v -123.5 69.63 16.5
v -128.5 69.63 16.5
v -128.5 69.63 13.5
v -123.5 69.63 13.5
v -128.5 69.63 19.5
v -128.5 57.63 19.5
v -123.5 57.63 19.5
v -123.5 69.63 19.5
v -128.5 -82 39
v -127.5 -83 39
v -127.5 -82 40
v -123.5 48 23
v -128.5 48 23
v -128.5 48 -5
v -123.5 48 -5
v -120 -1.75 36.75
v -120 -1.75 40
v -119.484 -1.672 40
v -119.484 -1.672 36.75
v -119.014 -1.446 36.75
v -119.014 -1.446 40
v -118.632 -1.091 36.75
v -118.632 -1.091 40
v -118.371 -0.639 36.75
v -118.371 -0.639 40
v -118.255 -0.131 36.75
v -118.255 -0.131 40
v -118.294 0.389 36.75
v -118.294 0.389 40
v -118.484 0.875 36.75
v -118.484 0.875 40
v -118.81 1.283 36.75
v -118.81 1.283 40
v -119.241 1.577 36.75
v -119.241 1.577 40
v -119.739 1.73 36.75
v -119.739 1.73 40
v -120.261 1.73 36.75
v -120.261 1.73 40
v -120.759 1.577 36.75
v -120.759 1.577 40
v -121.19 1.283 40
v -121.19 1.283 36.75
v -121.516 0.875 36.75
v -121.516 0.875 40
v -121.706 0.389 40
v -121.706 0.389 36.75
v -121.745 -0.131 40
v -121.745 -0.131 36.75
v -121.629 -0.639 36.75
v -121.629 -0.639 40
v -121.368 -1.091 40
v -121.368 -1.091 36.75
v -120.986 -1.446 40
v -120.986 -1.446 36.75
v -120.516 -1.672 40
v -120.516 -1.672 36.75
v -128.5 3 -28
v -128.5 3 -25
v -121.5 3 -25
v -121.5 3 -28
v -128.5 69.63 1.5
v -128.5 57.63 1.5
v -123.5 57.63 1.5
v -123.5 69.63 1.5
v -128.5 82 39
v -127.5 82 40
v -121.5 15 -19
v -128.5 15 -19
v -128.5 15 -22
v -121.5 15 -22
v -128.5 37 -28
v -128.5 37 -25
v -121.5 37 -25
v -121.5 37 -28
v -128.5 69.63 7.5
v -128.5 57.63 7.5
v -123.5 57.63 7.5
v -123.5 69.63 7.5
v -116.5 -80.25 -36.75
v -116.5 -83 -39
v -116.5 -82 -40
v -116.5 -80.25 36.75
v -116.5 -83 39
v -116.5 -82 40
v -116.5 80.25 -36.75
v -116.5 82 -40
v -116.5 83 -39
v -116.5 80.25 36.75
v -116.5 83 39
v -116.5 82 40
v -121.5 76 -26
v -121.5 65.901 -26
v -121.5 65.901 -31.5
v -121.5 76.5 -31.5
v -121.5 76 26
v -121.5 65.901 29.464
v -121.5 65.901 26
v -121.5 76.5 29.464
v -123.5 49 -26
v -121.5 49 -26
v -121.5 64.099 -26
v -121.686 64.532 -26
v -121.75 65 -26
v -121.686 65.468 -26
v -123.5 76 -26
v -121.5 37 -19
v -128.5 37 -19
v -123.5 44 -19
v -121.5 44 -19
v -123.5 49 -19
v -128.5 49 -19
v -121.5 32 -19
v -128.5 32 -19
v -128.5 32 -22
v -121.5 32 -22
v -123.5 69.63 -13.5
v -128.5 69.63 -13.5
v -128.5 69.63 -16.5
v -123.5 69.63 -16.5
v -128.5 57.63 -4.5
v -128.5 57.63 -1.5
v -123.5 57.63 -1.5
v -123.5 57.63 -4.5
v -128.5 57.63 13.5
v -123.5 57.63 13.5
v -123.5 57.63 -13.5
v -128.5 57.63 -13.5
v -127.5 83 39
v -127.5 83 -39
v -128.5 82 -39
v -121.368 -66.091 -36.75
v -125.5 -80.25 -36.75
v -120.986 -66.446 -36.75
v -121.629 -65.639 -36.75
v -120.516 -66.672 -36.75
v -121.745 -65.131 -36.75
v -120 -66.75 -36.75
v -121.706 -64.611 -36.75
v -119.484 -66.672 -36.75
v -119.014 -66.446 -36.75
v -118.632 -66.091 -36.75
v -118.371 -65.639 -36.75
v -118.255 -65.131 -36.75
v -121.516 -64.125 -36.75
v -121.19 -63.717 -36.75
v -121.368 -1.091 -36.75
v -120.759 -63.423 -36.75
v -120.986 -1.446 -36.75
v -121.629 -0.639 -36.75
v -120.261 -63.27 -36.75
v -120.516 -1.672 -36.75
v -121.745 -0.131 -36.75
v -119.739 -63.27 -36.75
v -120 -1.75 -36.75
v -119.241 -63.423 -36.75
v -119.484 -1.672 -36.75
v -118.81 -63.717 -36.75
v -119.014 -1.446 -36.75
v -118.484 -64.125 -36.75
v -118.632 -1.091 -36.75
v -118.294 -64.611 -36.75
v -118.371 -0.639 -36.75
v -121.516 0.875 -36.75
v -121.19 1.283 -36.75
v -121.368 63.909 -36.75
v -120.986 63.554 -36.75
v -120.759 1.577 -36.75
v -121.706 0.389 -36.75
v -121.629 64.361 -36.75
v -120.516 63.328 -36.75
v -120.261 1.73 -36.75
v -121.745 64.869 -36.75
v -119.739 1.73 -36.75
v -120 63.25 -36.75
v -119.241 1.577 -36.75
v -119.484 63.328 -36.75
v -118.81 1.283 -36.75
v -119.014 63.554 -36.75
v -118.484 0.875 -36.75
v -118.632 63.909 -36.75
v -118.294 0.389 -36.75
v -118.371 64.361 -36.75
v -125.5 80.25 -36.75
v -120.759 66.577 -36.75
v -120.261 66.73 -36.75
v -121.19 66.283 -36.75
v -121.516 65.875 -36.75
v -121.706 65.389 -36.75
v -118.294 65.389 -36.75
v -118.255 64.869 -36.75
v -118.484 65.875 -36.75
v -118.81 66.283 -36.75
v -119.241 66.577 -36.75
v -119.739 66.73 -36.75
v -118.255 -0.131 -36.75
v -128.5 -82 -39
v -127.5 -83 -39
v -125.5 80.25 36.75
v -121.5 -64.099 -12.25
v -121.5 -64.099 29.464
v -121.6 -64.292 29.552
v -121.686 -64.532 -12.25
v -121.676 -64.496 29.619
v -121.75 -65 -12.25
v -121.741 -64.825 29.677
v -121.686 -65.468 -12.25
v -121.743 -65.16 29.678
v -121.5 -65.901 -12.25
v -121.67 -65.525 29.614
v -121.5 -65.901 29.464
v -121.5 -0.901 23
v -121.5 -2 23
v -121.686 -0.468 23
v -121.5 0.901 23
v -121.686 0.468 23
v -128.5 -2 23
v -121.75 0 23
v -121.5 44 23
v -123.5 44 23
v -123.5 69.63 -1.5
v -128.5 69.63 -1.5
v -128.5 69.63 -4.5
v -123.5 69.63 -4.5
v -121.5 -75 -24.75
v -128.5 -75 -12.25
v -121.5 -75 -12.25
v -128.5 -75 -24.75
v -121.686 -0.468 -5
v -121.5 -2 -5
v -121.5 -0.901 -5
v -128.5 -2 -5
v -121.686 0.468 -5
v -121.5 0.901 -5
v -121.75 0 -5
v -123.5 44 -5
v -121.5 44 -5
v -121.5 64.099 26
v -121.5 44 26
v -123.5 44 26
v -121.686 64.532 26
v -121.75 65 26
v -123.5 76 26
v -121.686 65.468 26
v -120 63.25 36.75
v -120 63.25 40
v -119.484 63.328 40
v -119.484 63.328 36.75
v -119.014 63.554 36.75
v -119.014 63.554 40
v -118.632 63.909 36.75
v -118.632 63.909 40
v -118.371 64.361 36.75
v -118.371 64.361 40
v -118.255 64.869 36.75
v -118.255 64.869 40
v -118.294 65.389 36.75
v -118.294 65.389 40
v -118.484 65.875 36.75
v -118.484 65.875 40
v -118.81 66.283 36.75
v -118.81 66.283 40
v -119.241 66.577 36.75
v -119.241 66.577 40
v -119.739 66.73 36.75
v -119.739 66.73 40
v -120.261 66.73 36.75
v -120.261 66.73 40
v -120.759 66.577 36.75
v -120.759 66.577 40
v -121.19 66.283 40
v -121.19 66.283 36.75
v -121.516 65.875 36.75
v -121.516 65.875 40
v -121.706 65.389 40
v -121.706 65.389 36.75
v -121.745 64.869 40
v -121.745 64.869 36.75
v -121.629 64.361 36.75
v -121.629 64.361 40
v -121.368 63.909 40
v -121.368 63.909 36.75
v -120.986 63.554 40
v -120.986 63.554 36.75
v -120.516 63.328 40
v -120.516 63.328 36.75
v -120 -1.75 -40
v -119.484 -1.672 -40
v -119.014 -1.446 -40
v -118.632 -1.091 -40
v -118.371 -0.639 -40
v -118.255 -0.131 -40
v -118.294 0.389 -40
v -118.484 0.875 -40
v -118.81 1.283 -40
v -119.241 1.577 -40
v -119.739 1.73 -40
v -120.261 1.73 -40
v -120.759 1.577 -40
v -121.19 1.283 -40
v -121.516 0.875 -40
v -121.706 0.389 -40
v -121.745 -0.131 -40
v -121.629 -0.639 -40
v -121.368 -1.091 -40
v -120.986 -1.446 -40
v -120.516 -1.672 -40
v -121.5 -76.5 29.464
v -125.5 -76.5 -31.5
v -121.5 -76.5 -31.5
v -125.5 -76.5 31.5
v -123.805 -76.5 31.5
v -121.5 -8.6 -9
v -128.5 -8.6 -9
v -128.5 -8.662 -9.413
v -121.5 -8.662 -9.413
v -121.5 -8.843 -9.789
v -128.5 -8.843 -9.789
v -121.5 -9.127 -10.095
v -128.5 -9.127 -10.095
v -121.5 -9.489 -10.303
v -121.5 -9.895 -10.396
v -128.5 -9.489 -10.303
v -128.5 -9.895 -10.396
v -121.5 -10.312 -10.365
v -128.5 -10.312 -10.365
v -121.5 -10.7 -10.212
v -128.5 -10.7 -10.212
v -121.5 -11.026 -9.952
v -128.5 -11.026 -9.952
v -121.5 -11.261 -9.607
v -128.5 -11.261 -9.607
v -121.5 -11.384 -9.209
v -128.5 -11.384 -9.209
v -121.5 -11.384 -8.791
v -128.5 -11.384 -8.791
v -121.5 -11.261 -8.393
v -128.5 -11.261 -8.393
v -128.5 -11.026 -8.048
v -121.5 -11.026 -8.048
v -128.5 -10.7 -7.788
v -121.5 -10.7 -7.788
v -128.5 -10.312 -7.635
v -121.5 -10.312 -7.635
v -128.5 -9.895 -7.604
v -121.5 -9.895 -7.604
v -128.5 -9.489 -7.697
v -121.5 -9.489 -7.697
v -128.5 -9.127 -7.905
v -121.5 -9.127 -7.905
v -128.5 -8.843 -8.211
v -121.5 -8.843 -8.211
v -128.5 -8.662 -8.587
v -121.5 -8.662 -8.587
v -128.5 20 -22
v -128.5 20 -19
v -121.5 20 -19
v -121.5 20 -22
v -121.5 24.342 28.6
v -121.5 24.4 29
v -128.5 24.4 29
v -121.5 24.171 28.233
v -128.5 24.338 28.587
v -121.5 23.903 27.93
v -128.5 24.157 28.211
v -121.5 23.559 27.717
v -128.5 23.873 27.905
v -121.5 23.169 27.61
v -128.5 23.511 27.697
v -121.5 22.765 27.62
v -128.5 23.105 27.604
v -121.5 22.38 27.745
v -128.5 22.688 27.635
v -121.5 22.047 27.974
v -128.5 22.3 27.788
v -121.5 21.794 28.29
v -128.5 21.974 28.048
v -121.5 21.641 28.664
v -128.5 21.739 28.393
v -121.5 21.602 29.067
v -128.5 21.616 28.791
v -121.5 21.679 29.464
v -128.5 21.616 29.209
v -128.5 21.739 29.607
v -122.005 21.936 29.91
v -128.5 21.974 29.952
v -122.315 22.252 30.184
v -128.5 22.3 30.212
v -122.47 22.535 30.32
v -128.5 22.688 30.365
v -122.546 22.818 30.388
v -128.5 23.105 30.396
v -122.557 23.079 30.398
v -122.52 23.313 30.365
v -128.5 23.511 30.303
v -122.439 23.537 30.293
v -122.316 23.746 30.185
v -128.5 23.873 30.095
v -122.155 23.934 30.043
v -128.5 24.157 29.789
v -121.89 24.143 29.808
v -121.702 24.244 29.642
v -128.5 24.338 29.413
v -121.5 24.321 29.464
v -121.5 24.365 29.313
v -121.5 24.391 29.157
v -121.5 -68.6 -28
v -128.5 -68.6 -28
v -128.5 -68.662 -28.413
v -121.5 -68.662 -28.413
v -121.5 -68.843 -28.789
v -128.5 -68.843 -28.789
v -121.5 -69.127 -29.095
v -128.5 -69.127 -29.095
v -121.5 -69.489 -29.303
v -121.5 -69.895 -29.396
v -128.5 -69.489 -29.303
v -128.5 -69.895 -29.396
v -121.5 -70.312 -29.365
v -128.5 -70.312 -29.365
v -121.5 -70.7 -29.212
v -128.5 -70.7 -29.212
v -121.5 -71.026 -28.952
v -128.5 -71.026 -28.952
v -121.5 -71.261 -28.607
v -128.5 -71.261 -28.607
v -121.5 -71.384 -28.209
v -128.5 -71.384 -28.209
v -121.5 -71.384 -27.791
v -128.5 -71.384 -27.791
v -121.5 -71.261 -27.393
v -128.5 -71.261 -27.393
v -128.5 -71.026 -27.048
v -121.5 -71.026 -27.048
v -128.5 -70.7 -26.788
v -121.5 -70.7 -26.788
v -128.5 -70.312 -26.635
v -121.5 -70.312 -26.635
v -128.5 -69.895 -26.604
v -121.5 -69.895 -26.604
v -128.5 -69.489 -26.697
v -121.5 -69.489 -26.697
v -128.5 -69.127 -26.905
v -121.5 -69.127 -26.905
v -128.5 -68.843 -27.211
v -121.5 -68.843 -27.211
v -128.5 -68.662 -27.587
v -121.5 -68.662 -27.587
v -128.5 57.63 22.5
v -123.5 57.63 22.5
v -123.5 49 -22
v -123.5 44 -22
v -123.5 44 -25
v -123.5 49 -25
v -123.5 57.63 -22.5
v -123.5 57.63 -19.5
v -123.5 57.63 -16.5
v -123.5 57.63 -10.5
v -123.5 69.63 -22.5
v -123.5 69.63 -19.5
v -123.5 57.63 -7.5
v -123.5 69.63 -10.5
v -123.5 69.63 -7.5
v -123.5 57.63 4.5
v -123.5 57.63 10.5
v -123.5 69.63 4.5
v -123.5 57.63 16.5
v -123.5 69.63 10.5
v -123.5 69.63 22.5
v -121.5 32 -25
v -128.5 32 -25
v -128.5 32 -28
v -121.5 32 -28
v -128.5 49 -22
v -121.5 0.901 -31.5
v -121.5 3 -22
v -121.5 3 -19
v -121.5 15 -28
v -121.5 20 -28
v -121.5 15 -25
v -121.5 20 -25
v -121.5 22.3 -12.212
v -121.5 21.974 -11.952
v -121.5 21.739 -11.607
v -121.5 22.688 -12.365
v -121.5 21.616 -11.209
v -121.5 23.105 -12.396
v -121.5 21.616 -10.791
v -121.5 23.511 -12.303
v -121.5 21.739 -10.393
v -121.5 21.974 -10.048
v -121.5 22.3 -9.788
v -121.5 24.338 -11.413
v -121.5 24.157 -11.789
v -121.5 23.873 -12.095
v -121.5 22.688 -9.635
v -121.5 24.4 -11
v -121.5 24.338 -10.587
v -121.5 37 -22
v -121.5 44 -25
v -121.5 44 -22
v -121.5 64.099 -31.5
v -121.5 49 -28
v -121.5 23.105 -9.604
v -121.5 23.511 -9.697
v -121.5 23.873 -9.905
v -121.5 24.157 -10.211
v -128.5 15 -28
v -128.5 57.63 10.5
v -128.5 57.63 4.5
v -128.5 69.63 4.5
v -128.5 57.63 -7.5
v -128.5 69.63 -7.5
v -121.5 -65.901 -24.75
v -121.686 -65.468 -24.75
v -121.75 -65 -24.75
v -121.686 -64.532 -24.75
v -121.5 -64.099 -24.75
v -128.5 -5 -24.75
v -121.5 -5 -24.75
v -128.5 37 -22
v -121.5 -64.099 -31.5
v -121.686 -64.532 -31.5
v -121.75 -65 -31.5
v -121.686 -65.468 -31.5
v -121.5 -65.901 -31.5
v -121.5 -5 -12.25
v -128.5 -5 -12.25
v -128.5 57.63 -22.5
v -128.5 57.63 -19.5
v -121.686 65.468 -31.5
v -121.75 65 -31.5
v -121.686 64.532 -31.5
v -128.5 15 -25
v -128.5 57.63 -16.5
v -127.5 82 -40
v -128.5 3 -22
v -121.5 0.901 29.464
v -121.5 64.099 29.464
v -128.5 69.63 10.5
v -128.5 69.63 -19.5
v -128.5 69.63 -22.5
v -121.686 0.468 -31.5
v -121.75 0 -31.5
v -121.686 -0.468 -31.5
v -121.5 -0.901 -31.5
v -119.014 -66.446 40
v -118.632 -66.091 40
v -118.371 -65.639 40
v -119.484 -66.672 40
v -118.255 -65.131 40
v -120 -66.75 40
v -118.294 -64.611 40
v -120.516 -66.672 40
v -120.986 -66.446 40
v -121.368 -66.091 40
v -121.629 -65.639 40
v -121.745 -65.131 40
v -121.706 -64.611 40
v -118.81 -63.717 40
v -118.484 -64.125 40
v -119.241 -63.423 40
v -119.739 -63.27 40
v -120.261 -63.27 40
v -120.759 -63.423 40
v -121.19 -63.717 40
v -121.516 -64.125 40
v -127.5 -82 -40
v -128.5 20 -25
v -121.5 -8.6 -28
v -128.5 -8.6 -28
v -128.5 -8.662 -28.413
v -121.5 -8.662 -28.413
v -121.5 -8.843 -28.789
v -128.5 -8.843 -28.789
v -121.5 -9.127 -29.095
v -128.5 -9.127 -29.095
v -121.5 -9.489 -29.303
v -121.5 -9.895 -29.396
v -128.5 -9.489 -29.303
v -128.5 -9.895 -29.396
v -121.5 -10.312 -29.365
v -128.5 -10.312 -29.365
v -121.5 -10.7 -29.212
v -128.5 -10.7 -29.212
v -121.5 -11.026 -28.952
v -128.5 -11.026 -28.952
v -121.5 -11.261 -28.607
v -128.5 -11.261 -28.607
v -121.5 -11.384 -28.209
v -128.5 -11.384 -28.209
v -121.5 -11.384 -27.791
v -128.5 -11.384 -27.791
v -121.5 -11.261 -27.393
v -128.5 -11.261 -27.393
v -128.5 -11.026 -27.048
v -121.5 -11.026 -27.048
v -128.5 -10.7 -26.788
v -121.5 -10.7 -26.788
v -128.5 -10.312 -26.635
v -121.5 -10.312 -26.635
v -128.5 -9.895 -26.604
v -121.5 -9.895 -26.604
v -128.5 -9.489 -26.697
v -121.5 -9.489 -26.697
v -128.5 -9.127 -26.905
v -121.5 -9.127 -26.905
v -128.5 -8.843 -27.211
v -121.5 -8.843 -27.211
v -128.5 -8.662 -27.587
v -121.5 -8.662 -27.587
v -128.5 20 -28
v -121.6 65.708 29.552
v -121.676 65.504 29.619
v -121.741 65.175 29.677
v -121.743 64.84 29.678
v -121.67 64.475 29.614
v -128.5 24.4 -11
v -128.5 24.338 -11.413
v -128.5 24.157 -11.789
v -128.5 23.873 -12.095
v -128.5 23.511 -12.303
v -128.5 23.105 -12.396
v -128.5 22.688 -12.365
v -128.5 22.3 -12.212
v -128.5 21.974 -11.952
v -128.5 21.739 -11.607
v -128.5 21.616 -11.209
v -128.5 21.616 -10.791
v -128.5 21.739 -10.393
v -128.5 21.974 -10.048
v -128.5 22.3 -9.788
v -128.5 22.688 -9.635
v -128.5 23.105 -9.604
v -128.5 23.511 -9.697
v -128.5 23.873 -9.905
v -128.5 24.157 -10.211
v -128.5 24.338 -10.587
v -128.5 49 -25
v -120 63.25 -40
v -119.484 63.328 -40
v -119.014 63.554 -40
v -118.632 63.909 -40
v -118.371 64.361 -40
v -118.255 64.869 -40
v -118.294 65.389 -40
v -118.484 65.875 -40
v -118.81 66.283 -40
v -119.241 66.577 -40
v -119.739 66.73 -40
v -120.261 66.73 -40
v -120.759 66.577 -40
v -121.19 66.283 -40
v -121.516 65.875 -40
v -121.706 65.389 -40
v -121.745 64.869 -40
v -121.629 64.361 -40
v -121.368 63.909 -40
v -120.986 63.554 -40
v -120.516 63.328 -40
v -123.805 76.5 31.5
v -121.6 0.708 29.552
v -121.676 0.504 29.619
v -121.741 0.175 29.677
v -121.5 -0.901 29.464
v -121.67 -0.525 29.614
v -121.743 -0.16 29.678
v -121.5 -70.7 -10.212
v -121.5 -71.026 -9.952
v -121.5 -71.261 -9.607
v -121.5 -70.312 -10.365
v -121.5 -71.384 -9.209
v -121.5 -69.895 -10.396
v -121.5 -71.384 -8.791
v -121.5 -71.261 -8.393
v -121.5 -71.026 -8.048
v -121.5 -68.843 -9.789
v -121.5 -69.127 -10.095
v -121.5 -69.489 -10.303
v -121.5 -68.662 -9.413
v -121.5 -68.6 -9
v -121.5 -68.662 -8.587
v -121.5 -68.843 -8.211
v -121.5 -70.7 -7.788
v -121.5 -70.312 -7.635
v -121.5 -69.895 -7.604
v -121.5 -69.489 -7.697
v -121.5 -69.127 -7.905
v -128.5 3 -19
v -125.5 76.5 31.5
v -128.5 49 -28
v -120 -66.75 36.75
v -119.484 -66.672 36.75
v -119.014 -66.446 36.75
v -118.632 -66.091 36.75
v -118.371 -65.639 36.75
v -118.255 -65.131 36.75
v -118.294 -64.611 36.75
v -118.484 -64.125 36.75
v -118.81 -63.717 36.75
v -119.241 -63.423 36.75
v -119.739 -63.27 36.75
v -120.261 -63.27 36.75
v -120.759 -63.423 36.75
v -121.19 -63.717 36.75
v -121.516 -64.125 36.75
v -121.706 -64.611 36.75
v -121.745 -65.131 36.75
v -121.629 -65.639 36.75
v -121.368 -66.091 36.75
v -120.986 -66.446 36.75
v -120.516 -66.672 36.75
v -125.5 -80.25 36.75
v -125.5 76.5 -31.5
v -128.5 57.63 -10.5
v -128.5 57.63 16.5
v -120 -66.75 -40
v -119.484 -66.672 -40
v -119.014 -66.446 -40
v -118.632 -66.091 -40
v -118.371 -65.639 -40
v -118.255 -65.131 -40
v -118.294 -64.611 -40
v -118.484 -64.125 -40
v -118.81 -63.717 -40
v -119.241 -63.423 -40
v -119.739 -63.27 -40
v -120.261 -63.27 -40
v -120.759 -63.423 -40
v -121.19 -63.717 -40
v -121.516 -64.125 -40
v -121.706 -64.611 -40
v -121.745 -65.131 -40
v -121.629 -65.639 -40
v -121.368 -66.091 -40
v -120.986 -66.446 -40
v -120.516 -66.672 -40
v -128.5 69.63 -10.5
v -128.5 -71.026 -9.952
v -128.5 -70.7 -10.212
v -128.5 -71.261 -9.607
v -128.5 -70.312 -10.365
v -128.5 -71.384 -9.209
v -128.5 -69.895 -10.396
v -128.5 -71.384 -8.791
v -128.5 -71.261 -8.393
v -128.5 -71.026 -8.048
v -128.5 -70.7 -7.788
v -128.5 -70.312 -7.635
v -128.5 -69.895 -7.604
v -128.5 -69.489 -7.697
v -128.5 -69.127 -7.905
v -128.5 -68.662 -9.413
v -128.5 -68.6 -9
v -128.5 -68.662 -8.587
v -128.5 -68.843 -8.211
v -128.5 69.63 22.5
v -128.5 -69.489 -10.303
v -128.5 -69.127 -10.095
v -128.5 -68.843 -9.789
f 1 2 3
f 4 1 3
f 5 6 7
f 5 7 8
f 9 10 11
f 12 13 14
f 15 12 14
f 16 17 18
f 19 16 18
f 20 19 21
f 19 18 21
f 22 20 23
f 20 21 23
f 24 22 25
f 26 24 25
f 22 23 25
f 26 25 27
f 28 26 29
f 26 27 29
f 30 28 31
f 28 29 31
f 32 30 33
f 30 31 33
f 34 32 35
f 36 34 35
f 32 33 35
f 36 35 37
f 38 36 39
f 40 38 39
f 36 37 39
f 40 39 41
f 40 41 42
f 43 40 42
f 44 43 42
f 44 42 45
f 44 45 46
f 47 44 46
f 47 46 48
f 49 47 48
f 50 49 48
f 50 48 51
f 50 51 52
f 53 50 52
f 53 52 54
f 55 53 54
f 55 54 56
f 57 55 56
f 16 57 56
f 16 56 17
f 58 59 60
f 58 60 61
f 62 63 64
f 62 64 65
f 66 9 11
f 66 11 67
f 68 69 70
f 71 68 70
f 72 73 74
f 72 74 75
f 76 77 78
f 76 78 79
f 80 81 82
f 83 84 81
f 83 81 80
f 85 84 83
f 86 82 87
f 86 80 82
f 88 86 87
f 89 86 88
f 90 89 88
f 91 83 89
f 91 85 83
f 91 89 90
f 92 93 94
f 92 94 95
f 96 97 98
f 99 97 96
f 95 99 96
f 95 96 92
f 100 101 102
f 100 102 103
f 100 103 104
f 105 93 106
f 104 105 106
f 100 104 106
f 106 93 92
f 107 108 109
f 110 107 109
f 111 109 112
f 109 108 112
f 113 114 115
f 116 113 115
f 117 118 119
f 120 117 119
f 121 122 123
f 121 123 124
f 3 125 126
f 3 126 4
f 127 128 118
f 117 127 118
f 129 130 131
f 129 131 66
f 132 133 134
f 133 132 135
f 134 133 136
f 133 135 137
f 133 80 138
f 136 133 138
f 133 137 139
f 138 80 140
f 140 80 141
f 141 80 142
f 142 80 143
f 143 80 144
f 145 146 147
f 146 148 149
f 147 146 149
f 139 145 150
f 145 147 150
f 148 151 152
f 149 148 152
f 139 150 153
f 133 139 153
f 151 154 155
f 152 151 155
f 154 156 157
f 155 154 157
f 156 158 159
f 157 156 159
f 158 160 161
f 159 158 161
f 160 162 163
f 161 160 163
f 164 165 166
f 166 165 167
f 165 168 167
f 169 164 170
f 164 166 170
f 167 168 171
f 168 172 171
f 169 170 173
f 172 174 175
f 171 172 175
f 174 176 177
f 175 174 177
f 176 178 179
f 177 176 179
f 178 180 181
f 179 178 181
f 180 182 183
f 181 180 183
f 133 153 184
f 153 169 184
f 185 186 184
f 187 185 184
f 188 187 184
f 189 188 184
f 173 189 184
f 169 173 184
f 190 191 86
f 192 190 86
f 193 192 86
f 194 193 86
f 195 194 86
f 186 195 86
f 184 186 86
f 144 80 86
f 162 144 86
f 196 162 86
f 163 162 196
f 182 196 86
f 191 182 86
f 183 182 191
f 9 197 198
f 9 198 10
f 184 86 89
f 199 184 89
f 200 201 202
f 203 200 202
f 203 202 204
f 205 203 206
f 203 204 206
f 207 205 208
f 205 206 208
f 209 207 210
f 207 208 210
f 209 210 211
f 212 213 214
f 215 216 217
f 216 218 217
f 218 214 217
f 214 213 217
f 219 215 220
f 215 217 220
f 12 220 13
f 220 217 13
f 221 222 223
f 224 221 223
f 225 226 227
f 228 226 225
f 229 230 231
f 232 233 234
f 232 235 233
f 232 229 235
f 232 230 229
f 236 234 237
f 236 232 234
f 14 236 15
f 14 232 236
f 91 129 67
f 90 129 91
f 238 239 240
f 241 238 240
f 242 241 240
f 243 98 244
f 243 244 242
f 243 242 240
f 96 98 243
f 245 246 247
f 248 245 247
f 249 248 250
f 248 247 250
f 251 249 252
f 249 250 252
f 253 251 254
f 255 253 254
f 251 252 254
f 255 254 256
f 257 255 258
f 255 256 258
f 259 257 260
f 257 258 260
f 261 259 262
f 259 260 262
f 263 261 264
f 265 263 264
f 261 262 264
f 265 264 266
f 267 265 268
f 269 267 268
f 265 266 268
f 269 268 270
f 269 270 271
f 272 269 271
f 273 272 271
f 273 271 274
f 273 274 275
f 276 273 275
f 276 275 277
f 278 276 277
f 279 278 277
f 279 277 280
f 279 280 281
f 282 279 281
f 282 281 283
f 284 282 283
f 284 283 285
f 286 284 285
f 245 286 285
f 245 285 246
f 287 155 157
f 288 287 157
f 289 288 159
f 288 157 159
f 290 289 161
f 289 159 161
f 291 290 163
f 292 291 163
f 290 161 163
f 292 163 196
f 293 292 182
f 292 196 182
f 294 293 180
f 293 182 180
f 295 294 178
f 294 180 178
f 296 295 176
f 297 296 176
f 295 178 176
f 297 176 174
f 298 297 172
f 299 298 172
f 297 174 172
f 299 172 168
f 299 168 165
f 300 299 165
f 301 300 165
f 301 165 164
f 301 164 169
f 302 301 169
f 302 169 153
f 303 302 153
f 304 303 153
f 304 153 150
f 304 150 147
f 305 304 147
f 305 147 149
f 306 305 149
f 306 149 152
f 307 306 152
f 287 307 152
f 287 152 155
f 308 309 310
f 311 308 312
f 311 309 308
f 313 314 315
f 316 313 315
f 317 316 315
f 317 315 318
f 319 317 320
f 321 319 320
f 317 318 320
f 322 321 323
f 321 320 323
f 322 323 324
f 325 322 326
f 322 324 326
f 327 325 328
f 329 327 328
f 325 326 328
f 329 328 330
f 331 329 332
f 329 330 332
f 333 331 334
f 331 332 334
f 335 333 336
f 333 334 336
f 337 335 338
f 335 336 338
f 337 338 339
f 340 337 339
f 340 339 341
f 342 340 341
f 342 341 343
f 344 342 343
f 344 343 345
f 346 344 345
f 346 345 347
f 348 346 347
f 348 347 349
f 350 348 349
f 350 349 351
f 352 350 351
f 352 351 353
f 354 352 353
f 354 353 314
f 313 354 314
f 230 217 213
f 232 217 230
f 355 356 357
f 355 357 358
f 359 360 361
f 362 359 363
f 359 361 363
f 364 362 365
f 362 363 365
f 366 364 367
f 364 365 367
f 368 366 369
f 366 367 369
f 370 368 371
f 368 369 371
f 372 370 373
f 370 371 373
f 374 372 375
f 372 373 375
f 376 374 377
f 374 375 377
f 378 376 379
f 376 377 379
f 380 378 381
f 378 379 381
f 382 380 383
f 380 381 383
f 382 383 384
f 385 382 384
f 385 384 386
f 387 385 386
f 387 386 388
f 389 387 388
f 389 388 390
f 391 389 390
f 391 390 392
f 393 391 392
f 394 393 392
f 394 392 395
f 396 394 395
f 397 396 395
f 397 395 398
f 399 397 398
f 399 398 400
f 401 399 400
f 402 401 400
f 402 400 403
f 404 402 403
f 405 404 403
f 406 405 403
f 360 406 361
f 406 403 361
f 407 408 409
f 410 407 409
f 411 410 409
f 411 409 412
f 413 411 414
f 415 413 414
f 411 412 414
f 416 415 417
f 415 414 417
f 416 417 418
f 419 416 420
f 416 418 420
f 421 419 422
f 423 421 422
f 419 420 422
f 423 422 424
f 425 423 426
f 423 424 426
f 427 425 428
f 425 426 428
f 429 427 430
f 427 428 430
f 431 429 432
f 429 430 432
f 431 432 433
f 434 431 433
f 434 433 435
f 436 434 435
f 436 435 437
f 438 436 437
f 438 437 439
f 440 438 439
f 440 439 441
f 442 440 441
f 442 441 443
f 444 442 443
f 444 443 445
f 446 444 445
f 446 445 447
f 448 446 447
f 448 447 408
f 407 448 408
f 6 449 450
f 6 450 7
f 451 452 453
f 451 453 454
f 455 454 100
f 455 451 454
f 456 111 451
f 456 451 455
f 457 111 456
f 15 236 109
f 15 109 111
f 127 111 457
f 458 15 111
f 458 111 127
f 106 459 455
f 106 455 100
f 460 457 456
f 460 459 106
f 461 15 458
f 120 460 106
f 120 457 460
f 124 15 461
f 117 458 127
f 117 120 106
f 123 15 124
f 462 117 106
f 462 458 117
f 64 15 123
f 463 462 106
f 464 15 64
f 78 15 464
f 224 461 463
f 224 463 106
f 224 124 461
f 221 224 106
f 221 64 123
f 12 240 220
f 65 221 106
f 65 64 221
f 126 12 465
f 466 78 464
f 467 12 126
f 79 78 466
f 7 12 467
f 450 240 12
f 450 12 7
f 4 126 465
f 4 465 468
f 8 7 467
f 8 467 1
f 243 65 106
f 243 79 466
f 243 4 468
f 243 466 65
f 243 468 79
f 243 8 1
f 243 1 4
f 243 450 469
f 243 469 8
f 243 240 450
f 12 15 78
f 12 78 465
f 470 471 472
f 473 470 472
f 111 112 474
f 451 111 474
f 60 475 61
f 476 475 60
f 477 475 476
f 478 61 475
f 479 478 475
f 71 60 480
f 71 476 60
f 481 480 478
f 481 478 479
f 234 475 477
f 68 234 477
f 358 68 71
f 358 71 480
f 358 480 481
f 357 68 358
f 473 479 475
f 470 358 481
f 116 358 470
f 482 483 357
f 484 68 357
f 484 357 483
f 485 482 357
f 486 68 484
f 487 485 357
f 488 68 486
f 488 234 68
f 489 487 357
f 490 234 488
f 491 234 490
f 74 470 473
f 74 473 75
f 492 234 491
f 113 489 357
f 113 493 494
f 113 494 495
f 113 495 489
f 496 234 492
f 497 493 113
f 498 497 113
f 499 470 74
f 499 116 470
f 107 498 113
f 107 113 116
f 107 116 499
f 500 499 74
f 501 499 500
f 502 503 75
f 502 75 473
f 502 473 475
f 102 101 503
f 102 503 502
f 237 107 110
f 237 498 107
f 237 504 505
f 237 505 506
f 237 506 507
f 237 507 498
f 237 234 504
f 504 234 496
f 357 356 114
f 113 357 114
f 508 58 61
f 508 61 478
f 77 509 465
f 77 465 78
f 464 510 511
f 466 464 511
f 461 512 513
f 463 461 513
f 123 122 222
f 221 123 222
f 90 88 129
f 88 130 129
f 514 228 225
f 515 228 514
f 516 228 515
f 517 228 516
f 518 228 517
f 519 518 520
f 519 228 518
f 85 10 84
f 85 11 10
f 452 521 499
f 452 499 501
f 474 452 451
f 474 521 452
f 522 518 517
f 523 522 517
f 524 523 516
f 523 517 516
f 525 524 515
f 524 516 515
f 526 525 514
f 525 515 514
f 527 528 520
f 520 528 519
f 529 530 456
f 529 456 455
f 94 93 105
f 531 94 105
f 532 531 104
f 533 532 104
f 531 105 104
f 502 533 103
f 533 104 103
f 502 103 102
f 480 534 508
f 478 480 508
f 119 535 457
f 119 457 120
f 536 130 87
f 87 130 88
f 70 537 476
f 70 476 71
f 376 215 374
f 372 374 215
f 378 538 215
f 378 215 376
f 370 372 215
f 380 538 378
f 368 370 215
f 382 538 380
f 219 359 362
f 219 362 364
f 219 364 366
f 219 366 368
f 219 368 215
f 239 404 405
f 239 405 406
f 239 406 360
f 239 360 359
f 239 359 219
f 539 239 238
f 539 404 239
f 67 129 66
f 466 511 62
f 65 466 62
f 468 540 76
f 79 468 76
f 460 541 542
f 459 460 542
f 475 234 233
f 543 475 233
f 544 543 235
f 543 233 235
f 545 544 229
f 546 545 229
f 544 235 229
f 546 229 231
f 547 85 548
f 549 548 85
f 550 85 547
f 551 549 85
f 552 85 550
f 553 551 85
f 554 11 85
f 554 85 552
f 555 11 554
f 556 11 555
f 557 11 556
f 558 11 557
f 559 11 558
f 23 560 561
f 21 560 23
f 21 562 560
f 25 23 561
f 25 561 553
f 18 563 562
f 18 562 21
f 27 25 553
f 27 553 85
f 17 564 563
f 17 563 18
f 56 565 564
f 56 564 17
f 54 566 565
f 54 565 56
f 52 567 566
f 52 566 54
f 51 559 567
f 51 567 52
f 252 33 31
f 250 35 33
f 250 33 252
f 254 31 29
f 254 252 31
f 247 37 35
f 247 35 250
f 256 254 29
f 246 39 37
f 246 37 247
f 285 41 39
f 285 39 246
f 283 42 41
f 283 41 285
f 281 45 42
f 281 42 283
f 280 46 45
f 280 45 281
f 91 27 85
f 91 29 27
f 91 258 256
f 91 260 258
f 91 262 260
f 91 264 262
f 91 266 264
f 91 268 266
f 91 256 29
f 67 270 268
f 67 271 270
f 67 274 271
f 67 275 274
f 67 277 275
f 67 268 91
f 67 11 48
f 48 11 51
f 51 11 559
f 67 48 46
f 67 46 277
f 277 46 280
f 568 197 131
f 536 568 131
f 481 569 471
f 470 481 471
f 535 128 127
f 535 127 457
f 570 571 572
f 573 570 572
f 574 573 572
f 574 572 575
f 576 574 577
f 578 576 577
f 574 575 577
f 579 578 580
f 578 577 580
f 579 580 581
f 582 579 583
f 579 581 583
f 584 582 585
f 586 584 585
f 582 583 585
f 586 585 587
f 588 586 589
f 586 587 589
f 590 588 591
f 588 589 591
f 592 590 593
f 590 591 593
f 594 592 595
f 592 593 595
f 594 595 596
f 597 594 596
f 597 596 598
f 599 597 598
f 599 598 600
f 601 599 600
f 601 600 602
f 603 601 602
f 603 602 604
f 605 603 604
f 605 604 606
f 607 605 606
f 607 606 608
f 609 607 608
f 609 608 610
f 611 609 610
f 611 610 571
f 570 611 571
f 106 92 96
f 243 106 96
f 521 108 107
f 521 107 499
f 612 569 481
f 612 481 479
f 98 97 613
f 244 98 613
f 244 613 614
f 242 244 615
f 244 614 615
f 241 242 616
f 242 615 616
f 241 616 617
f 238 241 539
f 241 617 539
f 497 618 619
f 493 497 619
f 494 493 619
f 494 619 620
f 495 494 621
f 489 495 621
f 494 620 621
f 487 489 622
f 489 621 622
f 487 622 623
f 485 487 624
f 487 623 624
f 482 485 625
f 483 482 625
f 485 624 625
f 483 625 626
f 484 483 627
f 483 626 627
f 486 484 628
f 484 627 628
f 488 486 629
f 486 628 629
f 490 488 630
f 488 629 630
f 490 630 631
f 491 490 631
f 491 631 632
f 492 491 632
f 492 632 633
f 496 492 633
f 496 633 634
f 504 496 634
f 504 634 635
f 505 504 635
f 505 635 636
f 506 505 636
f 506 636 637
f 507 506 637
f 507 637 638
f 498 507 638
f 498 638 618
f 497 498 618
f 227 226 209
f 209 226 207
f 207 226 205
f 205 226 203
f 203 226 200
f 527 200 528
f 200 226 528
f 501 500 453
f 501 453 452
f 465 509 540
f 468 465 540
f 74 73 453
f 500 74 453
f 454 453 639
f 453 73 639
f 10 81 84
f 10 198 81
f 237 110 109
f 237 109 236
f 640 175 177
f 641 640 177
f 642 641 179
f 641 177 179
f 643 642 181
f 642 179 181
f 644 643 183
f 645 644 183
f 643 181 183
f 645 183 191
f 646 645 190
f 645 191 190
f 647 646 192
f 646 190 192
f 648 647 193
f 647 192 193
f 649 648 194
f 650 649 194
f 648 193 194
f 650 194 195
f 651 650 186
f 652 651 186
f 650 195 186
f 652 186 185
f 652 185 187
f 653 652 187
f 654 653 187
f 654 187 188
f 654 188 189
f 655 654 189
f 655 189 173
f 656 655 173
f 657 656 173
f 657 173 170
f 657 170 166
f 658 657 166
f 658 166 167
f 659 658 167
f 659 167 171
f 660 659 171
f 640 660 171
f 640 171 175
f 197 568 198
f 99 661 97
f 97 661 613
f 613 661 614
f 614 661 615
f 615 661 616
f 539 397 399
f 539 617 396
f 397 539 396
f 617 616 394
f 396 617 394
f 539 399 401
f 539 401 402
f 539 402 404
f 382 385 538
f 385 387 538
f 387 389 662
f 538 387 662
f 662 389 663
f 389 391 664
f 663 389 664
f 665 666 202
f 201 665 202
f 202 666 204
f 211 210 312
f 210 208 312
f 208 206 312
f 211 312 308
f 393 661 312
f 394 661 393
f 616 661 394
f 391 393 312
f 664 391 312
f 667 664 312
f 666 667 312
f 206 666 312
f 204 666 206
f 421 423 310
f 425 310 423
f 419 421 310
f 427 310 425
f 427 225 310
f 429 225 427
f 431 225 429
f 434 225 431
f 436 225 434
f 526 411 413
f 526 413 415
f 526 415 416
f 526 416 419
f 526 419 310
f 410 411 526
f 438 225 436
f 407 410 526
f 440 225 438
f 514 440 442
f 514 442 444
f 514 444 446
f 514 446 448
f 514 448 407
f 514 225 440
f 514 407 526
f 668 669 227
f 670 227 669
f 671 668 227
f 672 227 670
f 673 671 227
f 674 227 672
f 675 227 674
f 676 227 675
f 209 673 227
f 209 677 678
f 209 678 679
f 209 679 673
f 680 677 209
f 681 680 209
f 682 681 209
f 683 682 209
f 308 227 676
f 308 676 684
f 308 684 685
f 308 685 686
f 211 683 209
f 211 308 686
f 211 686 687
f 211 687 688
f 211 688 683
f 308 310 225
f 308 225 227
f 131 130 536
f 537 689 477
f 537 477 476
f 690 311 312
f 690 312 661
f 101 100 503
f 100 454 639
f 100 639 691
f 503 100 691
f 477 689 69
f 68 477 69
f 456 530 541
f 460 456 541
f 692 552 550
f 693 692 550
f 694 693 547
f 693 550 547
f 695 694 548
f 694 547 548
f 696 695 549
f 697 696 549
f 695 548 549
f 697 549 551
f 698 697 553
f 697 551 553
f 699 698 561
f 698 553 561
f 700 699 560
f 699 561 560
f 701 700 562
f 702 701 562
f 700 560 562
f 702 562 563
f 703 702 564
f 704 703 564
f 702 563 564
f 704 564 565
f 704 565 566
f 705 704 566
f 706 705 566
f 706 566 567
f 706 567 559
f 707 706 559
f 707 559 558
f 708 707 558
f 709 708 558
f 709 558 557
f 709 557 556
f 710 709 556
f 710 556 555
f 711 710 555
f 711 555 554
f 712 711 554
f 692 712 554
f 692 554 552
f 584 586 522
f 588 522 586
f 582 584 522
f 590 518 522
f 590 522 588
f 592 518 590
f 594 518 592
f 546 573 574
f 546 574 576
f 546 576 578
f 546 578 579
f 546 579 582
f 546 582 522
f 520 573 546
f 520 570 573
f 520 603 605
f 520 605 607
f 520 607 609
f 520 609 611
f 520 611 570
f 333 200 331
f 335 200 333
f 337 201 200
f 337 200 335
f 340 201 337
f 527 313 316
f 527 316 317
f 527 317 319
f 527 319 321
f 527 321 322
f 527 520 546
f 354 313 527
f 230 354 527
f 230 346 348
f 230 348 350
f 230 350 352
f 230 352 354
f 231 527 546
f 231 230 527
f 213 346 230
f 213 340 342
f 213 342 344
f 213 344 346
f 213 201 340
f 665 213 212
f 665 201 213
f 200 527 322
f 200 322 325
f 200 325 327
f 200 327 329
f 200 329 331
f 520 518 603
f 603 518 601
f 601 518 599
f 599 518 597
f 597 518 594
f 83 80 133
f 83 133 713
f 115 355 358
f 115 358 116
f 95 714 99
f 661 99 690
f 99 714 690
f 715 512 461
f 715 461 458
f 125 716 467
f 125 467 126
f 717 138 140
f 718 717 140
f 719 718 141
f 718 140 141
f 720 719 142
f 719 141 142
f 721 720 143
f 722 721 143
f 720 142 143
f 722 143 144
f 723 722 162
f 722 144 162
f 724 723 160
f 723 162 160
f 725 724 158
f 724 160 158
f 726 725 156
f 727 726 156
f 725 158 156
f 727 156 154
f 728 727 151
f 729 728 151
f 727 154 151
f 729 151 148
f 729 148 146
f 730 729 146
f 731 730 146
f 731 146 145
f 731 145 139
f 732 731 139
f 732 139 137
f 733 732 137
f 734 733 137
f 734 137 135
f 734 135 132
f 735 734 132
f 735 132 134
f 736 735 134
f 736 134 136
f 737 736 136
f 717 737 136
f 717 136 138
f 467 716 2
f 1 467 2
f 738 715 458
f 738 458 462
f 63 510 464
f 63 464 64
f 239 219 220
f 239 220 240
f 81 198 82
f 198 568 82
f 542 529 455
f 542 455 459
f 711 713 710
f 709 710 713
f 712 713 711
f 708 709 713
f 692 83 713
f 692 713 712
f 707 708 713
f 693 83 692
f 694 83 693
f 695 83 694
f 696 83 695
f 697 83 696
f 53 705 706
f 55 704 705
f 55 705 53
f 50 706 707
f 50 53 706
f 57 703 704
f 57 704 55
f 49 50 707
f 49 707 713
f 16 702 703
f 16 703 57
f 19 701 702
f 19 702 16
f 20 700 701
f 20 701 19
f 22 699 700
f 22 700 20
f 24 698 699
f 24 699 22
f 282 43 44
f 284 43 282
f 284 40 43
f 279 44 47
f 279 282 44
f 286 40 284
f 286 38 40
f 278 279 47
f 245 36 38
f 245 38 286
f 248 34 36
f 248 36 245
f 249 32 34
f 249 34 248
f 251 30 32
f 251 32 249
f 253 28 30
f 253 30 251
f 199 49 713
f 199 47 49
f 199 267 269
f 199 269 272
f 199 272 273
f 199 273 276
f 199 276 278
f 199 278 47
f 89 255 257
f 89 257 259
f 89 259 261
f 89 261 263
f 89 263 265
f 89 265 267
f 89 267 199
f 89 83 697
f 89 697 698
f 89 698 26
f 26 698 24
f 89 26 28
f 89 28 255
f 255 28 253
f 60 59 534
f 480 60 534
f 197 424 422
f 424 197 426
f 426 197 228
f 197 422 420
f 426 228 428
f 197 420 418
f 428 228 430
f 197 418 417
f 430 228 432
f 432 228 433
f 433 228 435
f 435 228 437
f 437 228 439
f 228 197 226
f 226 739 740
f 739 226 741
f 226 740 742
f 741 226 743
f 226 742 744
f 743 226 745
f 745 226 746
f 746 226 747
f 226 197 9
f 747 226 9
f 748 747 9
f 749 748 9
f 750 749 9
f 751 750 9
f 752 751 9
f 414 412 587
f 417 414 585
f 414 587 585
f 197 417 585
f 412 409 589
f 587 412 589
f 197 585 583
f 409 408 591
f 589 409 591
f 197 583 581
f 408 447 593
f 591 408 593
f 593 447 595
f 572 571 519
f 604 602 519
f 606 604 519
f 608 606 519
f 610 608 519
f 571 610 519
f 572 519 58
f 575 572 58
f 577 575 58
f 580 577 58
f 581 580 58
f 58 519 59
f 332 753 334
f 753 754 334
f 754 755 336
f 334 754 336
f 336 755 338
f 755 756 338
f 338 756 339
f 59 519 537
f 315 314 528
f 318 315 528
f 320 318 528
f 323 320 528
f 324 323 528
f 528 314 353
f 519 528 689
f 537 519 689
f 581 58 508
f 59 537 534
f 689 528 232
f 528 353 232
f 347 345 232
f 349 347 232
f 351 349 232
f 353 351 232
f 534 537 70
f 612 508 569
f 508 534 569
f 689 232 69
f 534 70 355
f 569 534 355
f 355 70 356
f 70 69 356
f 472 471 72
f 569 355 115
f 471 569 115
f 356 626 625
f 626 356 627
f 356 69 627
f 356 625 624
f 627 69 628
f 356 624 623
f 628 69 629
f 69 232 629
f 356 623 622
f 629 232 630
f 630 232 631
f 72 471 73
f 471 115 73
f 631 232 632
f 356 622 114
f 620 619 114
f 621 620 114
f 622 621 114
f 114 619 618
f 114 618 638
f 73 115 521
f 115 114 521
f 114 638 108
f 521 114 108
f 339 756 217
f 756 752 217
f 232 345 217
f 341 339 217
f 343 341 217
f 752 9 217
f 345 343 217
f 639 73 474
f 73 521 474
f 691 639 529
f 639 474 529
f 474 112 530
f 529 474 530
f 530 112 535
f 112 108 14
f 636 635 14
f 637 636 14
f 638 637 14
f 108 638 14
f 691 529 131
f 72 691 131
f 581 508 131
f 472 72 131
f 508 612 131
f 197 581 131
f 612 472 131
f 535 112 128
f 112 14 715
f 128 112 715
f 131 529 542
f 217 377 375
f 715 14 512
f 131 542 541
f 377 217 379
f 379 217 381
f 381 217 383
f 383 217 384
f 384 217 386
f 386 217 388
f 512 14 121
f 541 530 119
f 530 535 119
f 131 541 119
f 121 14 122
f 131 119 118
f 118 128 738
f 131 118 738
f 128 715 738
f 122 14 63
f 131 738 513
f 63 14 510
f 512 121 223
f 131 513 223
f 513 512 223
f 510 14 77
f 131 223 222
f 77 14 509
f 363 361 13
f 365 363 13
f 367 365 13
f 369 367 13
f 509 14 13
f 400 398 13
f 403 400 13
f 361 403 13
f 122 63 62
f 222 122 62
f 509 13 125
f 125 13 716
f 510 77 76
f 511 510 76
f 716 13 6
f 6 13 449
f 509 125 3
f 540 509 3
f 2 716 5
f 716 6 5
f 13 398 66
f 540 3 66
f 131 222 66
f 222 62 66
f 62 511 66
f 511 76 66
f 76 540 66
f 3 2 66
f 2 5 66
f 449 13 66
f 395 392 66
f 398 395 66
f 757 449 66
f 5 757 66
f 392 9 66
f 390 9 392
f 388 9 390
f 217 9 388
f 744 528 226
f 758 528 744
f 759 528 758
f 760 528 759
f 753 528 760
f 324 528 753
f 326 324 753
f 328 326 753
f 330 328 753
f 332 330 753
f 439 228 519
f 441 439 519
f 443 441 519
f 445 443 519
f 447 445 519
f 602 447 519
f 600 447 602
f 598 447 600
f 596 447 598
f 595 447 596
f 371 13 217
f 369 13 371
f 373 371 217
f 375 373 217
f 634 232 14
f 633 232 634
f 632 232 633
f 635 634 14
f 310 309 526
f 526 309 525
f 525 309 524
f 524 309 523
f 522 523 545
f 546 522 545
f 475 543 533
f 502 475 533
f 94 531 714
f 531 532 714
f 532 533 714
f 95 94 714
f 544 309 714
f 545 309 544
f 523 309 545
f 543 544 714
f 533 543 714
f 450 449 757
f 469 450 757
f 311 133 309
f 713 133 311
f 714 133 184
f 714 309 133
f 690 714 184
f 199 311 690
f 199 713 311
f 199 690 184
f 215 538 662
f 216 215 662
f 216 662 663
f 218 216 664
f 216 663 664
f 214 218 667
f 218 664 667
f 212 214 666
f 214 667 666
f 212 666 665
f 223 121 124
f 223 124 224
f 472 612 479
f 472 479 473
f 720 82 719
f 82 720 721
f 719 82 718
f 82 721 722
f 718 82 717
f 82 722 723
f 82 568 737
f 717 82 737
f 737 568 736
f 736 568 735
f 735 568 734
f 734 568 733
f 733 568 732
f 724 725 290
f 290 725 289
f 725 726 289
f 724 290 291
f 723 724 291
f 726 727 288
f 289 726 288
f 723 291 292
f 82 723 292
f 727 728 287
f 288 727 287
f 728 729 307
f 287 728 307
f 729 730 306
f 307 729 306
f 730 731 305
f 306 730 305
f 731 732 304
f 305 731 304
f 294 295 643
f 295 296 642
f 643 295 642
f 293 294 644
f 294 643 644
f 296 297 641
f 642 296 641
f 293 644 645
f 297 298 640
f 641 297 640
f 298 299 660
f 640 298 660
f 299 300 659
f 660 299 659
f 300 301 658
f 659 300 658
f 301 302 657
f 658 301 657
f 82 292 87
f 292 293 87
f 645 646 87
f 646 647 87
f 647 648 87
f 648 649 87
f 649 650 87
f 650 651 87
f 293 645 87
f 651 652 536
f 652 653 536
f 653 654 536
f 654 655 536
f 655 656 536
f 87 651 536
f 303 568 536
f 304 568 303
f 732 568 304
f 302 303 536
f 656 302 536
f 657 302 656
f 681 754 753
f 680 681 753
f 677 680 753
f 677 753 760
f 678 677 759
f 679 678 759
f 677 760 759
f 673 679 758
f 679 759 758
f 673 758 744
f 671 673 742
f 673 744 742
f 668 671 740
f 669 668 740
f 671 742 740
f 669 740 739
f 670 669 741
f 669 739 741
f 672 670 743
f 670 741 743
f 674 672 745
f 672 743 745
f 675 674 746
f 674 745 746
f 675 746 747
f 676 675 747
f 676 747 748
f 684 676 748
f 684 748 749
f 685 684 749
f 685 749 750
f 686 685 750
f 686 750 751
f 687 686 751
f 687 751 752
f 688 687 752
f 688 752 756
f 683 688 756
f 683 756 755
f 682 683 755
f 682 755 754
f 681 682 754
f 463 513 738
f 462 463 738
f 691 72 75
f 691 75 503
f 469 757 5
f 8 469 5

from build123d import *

# Parameters (mm, degrees)
SKETCH008_W     = 166
SKETCH008_H     = 80
PAD005_DEPTH    = 12
SKETCH009_W     = 160.5
SKETCH009_H     = 73.5
POCKET002_DEPTH = 9
SKETCH016_W     = 153
SKETCH016_H     = 63
PAD007_DEPTH    = 4
SKETCH012_R     = 1.4
SKETCH012_W     = 70
SKETCH012_H     = 12.5
SKETCH012_W_2   = 50
SKETCH012_H_2   = 28
SKETCH012_W_3   = 12
SKETCH012_H_3   = 3
POCKET008_DEPTH = 12.001
SKETCH023_R     = 1.75
POCKET011_DEPTH = 80.001
SKETCH039_W     = 32
SKETCH039_H     = 52
POCKET036_DEPTH = 2
CHAMFER033_SIZE = 1
POCKET038_DEPTH = 154


with BuildPart() as part:
    # Sketch008 → Pad005 (new body)
    with BuildSketch(Plane.YZ):
        Rectangle(SKETCH008_W, SKETCH008_H)
    extrude(amount=PAD005_DEPTH)

    # Sketch009 (on Face6 of Pad005) → Pocket002 (cut)
    with BuildSketch(Plane.YZ.offset(12)):
        Rectangle(SKETCH009_W, SKETCH009_H)
    extrude(amount=-POCKET002_DEPTH, mode=Mode.SUBTRACT)

    # Sketch016 (on Face11 of Pocket002) → Pad007 (join)
    with BuildSketch(Plane.YZ.offset(3)):
        Rectangle(SKETCH016_W, SKETCH016_H)
    extrude(amount=PAD007_DEPTH)

    # Sketch012 (on Face4 of Pocket002) → Pocket008 (cut, through all)
    with BuildSketch(Plane(origin=(0, 0, 0), x_dir=(0, 1, 0), z_dir=(-1, 0, 0))):
        with Locations((23, 11)):
            Circle(SKETCH012_R)
        with Locations((23, -29)):
            Circle(SKETCH012_R)
        with Locations((-70, 28)):
            Circle(SKETCH012_R)
        with Locations((-70, 9)):
            Circle(SKETCH012_R)
        with Locations((-10, 28)):
            Circle(SKETCH012_R)
        with Locations((-10, 9)):
            Circle(SKETCH012_R)
        with Locations((-40, 18.5)):
            Rectangle(SKETCH012_W, SKETCH012_H)
        with Locations((23, -9)):
            Rectangle(SKETCH012_W_2, SKETCH012_H_2)
        with Locations((9, 26.5)):
            Rectangle(SKETCH012_W_3, SKETCH012_H_3)
        with Locations((26, 26.5)):
            Rectangle(SKETCH012_W_3, SKETCH012_H_3)
        with Locations((43, 26.5)):
            Rectangle(SKETCH012_W_3, SKETCH012_H_3)
        with Locations((9, 20.5)):
            Rectangle(SKETCH012_W_3, SKETCH012_H_3)
        with Locations((26, 20.5)):
            Rectangle(SKETCH012_W_3, SKETCH012_H_3)
        with Locations((43, 20.5)):
            Rectangle(SKETCH012_W_3, SKETCH012_H_3)
        with Locations((63.63, 21)):
            Rectangle(SKETCH012_W_3, SKETCH012_H_3)
        with Locations((63.63, 15)):
            Rectangle(SKETCH012_W_3, SKETCH012_H_3)
        with Locations((63.63, 9)):
            Rectangle(SKETCH012_W_3, SKETCH012_H_3)
        with Locations((63.63, 3)):
            Rectangle(SKETCH012_W_3, SKETCH012_H_3)
        with Locations((63.63, -3)):
            Rectangle(SKETCH012_W_3, SKETCH012_H_3)
        with Locations((63.63, -9)):
            Rectangle(SKETCH012_W_3, SKETCH012_H_3)
        with Locations((63.63, -15)):
            Rectangle(SKETCH012_W_3, SKETCH012_H_3)
        with Locations((63.63, -21)):
            Rectangle(SKETCH012_W_3, SKETCH012_H_3)
    extrude(amount=-POCKET008_DEPTH, mode=Mode.SUBTRACT)

    # Sketch023 (on Face1 of Pocket008) → Pocket011 (cut, through all)
    with BuildSketch(Plane(origin=(0, 0, 40), x_dir=(0, -1, 0), z_dir=(0, 0, 1))):
        with Locations((-65, 8.5)):
            Circle(SKETCH023_R)
        with Locations((65, 8.5)):
            Circle(SKETCH023_R)
        with Locations((0, 8.5)):
            Circle(SKETCH023_R)
    extrude(amount=-POCKET011_DEPTH, mode=Mode.SUBTRACT)

    # Sketch039 → Pocket036 (cut)
    with BuildSketch(Plane.YZ.offset(7)):
        with Locations((60, 0)):
            Rectangle(SKETCH039_W, SKETCH039_H)
    extrude(amount=-POCKET036_DEPTH, mode=Mode.SUBTRACT)

    # Chamfer033
    chamfer033_edges = [part.edges().sort_by_distance(p)[0] for p in [
        (6, -83, 40),
        (6, 83, 40),
        (6, -83, -40),
        (6, 83, -40),
        (0, 83, 0),
        (0, 0, -40),
        (0, -83, 0),
        (0, 0, 40),
    ]]
    chamfer(chamfer033_edges, length=CHAMFER033_SIZE)

    # Sketch056 (on Face103 of Chamfer033) → Pocket038 (cut)
    with BuildSketch(Plane(origin=(0, -76.5, 0), x_dir=(0, 0, -1), z_dir=(0, -1, 0))):
        Polygon((-31.764254, 4.395752), (-28.984535, 7.542603), (-32.262505, 7.752388), align=None)
    extrude(amount=-POCKET038_DEPTH, mode=Mode.SUBTRACT)


with BuildPart() as part_1:
    # Body004 placement: moved
    add(part.part.moved(Location((-128.5, 0, 0))))


solid = part_1.part
